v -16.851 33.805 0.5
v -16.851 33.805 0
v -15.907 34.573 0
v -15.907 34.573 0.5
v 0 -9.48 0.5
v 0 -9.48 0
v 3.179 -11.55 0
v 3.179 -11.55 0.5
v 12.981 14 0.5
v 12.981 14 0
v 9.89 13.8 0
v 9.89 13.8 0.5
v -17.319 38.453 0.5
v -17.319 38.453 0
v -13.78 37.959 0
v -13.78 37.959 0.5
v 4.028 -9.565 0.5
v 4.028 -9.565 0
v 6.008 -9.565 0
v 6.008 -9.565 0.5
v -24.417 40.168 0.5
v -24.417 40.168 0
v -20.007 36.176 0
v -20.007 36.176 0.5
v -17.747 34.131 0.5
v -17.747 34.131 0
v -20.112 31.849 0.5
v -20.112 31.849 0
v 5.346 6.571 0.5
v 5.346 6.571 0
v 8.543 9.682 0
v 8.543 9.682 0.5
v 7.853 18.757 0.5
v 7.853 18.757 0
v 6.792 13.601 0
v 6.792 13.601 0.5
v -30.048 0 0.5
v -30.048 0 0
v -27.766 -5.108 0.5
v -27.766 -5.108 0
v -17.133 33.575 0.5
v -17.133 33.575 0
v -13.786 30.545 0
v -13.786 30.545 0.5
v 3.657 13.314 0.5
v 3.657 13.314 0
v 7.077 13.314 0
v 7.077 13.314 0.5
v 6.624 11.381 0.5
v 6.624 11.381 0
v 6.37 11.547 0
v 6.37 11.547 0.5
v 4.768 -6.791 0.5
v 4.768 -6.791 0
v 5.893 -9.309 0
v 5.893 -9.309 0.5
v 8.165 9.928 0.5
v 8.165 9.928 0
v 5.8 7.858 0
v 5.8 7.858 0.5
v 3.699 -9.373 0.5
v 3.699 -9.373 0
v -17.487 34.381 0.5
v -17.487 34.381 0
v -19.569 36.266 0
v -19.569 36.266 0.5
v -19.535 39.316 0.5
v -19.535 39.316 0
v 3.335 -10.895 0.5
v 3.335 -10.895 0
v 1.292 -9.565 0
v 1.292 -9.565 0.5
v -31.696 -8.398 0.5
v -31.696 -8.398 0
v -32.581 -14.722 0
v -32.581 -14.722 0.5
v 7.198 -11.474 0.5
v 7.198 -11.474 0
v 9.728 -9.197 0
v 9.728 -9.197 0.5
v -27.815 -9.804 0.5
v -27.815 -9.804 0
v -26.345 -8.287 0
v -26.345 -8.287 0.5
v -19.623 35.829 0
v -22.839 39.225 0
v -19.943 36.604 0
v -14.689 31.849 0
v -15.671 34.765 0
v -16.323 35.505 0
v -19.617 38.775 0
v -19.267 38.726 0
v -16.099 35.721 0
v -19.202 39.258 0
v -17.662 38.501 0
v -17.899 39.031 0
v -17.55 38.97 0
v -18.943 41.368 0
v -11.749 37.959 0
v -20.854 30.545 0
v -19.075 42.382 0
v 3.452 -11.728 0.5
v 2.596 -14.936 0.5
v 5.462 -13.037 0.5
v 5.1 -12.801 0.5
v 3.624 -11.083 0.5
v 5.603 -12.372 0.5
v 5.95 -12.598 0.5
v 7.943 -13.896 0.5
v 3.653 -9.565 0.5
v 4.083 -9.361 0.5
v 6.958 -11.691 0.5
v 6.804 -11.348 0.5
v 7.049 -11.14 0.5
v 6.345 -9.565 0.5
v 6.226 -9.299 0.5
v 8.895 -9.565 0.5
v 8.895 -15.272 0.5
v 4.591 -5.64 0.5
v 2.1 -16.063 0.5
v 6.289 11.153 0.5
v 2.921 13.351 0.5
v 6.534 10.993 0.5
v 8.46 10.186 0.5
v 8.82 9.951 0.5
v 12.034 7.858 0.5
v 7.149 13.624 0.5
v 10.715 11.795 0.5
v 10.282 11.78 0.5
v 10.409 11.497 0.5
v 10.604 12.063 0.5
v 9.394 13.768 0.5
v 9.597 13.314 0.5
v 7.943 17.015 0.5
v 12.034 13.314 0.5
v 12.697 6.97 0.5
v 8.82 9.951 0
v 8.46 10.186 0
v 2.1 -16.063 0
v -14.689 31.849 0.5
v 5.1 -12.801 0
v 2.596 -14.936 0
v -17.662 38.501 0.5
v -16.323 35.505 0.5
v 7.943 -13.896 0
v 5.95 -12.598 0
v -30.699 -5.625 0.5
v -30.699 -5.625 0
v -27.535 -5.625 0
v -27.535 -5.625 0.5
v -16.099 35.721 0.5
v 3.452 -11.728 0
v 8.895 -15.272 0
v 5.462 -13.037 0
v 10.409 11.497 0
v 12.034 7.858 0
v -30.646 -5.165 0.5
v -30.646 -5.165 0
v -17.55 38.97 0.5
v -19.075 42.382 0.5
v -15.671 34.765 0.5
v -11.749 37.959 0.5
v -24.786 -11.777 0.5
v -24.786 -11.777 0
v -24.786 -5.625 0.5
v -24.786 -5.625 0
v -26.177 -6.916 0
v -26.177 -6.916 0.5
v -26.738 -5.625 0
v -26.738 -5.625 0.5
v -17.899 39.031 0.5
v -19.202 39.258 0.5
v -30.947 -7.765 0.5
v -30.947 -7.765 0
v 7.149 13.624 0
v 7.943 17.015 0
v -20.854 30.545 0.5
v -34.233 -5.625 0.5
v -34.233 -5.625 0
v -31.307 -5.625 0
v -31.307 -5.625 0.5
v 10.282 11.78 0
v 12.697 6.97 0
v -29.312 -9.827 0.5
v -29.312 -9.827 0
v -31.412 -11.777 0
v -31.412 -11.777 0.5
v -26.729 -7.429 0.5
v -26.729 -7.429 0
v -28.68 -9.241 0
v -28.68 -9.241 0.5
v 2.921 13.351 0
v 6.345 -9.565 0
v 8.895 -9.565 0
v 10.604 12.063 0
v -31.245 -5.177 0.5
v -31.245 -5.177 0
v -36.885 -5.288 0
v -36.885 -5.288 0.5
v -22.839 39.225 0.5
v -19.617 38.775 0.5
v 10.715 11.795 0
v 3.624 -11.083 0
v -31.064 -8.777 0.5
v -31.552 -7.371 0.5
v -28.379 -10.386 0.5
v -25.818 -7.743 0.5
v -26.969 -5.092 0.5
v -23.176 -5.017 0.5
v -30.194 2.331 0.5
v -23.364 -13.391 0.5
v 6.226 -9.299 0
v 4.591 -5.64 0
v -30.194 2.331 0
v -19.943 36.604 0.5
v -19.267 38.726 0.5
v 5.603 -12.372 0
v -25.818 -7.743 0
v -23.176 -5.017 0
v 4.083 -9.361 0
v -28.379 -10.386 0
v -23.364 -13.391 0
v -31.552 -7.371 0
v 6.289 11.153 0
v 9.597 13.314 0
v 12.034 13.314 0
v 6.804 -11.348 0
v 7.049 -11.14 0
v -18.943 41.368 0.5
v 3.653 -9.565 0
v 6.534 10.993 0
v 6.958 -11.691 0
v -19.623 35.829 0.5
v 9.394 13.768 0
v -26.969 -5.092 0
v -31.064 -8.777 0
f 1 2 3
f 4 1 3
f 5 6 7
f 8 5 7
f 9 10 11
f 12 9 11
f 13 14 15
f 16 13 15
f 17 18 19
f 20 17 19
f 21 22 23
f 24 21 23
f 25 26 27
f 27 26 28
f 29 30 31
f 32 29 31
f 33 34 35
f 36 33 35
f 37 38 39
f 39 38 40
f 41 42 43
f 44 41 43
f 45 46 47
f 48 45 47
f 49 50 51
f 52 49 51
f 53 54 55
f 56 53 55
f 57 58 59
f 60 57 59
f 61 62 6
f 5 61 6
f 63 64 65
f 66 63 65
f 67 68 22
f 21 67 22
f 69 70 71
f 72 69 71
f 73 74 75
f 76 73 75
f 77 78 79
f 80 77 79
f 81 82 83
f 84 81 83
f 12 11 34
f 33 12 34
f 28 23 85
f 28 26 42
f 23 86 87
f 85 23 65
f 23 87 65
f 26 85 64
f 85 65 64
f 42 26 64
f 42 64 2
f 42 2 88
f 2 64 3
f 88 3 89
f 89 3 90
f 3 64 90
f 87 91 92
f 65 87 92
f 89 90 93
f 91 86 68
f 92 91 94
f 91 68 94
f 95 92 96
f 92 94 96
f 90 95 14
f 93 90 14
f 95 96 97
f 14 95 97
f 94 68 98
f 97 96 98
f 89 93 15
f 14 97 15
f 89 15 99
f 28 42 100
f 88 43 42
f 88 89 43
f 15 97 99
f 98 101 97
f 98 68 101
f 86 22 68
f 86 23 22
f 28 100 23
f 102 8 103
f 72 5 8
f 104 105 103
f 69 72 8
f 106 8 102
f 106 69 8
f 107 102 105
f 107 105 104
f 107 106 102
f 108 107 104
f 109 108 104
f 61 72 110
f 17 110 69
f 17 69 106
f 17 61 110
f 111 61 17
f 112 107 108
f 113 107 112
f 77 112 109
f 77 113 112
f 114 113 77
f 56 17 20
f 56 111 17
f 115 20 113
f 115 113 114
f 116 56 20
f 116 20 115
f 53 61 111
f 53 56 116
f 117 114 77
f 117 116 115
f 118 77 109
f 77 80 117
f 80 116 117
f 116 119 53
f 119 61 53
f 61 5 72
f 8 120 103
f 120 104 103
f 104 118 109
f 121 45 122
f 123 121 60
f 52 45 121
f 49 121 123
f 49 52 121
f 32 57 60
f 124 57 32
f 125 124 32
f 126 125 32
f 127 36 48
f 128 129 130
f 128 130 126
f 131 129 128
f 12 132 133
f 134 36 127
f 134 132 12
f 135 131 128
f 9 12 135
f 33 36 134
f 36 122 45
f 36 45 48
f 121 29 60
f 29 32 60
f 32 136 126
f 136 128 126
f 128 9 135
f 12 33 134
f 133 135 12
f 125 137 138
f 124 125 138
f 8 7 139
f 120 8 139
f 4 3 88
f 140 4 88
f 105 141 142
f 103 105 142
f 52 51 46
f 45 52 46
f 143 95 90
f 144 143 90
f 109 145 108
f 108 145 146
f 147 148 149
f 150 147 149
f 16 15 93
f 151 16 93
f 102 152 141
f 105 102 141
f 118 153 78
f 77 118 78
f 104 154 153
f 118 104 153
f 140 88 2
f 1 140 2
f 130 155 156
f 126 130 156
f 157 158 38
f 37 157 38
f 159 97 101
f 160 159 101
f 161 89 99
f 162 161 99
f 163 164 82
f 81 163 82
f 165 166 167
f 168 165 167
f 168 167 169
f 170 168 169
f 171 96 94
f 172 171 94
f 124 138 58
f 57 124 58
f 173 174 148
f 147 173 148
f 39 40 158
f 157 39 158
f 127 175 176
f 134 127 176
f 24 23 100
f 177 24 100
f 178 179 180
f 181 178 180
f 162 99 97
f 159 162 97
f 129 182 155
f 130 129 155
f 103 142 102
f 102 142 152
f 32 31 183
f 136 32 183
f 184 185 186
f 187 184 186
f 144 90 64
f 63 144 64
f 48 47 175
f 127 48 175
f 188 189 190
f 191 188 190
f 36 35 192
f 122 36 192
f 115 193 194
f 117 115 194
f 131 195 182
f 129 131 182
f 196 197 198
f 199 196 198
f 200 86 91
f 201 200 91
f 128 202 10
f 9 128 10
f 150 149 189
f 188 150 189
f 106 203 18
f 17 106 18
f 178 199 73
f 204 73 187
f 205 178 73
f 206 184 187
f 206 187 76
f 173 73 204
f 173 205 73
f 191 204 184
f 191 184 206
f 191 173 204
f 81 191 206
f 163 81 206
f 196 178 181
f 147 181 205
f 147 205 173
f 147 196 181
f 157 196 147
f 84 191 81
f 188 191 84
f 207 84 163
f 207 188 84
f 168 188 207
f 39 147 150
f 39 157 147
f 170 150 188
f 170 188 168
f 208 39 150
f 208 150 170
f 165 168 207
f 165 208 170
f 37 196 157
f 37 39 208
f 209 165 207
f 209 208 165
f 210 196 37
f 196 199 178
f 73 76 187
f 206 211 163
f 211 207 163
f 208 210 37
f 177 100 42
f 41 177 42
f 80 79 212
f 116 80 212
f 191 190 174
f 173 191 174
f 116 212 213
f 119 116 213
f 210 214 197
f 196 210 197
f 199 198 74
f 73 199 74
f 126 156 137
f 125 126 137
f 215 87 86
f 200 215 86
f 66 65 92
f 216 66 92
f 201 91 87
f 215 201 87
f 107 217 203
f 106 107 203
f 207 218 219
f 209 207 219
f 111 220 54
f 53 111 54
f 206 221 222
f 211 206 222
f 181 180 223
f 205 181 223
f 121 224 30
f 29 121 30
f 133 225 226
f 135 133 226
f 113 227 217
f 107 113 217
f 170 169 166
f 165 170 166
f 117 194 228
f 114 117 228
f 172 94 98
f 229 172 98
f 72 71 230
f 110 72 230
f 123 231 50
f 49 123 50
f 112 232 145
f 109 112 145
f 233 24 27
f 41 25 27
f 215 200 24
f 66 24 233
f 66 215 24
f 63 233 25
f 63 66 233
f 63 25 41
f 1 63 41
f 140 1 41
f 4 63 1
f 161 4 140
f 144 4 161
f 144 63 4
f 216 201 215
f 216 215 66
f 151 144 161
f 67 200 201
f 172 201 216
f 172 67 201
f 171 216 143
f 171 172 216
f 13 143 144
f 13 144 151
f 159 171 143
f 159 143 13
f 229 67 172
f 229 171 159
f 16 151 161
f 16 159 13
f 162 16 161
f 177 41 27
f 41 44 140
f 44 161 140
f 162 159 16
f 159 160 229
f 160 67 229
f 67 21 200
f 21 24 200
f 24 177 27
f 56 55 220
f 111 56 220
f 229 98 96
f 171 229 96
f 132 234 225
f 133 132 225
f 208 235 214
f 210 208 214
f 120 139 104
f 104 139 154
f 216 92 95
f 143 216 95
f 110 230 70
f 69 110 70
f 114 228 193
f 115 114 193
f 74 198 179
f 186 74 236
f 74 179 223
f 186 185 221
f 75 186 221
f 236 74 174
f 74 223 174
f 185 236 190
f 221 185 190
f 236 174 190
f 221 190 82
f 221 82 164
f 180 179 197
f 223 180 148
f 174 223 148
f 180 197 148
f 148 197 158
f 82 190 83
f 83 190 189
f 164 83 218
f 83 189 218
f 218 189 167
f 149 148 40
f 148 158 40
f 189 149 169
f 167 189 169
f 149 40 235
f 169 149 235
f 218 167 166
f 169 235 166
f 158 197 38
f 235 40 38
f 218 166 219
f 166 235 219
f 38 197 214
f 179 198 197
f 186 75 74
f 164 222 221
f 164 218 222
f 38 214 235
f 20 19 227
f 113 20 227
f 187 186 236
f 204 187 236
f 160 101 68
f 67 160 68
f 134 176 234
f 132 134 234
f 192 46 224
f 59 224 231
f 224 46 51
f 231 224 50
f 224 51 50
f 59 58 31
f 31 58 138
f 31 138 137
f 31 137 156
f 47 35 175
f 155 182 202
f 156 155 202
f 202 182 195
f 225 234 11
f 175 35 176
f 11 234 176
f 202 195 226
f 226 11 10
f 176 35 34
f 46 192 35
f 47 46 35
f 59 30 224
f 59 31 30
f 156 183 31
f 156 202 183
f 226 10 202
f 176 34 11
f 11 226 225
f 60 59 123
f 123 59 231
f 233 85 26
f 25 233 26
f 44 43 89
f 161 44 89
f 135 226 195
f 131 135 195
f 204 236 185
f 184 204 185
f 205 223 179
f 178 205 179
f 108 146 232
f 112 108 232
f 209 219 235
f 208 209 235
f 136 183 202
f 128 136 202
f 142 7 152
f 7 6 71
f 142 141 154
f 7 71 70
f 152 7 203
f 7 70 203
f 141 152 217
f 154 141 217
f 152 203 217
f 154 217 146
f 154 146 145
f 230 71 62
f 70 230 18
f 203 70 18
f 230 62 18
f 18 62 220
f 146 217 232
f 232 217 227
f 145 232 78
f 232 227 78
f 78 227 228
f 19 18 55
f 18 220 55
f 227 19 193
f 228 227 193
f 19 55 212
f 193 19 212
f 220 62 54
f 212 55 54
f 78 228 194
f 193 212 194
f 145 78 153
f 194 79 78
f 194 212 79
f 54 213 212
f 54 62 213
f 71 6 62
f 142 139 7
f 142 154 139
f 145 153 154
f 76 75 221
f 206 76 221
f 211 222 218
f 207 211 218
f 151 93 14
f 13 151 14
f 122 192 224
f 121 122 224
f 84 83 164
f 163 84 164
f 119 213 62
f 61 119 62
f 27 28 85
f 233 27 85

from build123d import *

# Parameters (mm, degrees)
F1_DEPTH = 0.5
F2_DEPTH = 0.5
F3_DEPTH = 0.5
F4_DEPTH = 0.5


with BuildPart() as f1:
    # F0 (on Top) → F1 (new body)
    with BuildSketch(Plane.XY):
        Polygon((-19.6167158214, 38.774628421), (-19.5352793666, 39.3164274172), (-24.4169946969, 40.1676073624), (-20.0072566577, 36.176349387), (-19.9430271905, 36.6036698165), (-22.8393096477, 39.2250977457), align=None)
        Polygon((-19.2672995463, 38.7257853704), (-19.2019097122, 39.2583008069), (-19.5352793666, 39.3164274172), (-19.6167158214, 38.774628421), align=None)
        Polygon((-19.2019097122, 39.2583008069), (-18.9428310841, 41.3681603968), (-17.8985916241, 39.0310531811), (-17.5501562208, 38.9702996944), (-19.0745089203, 42.3819459975), (-19.5352793666, 39.3164274172), align=None)
        Polygon((-17.5501562208, 38.9702996944), (-17.8985916241, 39.0310531811), (-17.6619287146, 38.5013790836), (-17.3192348579, 38.4534757243), align=None)
        Polygon((-17.6619287146, 38.5013790836), (-17.8985916241, 39.0310531811), (-19.2019097122, 39.2583008069), (-19.2672995463, 38.7257853704), align=None)
        Polygon((-11.7486538365, 37.9587449133), (-17.5501562208, 38.9702996944), (-17.3192348579, 38.4534757243), (-13.7800006196, 37.9587449133), (-16.0985169635, 35.7213929896), (-15.6711739502, 34.7649586869), align=None)
        Polygon((-17.3192348579, 38.4534757243), (-17.6619287146, 38.5013790836), (-16.3230122226, 35.5047566474), (-16.0985169635, 35.7213929896), align=None)
        Polygon((-16.0985169635, 35.7213929896), (-16.3230122226, 35.5047566474), (-15.9067585949, 34.573141444), (-15.6711739502, 34.7649586869), align=None)
        Polygon((-15.6711739502, 34.7649586869), (-15.9067585949, 34.573141444), (-14.6894223923, 31.8486272574), (-16.850563786, 33.8046783304), (-17.1329166357, 33.5747815762), (-13.7857930403, 30.545296916), align=None)
        Polygon((-15.9067585949, 34.573141444), (-16.3230122226, 35.5047566474), (-17.487427419, 34.3811041934), (-16.850563786, 33.8046783304), align=None)
        Polygon((-20.1117750257, 31.8486272574), (-19.623056132, 35.828609136), (-20.0072566577, 36.176349387), (-20.8536460996, 30.545296916), (-17.1329166357, 33.5747815762), (-17.7470157672, 34.1306032677), align=None)
        Polygon((-19.569407656, 36.2655064304), (-19.2672995463, 38.7257853704), (-19.6167158214, 38.774628421), (-19.9430271905, 36.6036698165), align=None)
        Polygon((-19.623056132, 35.828609136), (-19.569407656, 36.2655064304), (-19.9430271905, 36.6036698165), (-20.0072566577, 36.176349387), align=None)
        Polygon((-17.487427419, 34.3811041934), (-19.569407656, 36.2655064304), (-19.623056132, 35.828609136), (-17.7470157672, 34.1306032677), align=None)
        Polygon((-16.850563786, 33.8046783304), (-17.487427419, 34.3811041934), (-17.7470157672, 34.1306032677), (-17.1329166357, 33.5747815762), align=None)
    extrude(amount=F1_DEPTH)


with BuildPart() as f2:
    # F0 (on Top) → F2 (new body)
    with BuildSketch(Plane.XY):
        Polygon((9.727650322, -9.1974353418), (6.2263924098, -9.2991656192), (6.3452222104, -9.5651180134), (8.8952556252, -9.5651180134), (7.0487103065, -11.1395912723), (7.1981960204, -11.4741545155), align=None)
        Polygon((7.1981960204, -11.4741545155), (6.9575831839, -11.6907260732), (7.9428590834, -13.8958672333), (5.9496410632, -12.5979577836), (5.4620956469, -13.0367891934), (8.8952556252, -15.2723352968), align=None)
        Polygon((2.5960605126, -14.9361826479), (3.4516637515, -11.7276707083), (3.1787102129, -11.5499335147), (2.1001494024, -16.0628203303), (5.4620956469, -13.0367891934), (5.1001133386, -12.8010797758), align=None)
        Polygon((3.6530727004, -9.5651180134), (3.6990843002, -9.3725974433), (0, -9.4800756359), (3.1787102129, -11.5499335147), (3.3351218093, -10.8954800758), (1.2920658497, -9.5651180134), align=None)
        Polygon((4.0826552732, -9.3614526541), (4.768196959, -6.7906714976), (5.8933373326, -9.3088426514), (6.2263924098, -9.2991656192), (4.591259174, -5.6395819411), (3.6990843002, -9.3725974433), align=None)
        Polygon((6.2263924098, -9.2991656192), (5.8933373326, -9.3088426514), (6.0078433527, -9.5651180134), (6.3452222104, -9.5651180134), align=None)
        Polygon((4.0283445073, -9.5651180134), (4.0826552732, -9.3614526541), (3.6990843002, -9.3725974433), (3.6530727004, -9.5651180134), align=None)
        Polygon((3.4516637515, -11.7276707083), (3.6235053597, -11.0832647192), (3.3351218093, -10.8954800758), (3.1787102129, -11.5499335147), align=None)
        Polygon((5.9496410632, -12.5979577836), (5.6030339038, -12.3722600912), (5.1001133386, -12.8010797758), (5.4620956469, -13.0367891934), align=None)
        Polygon((7.0487103065, -11.1395912723), (6.8044055273, -11.3478999111), (6.9575831839, -11.6907260732), (7.1981960204, -11.4741545155), align=None)
        Polygon((6.3452222104, -9.5651180134), (6.0078433527, -9.5651180134), (6.8044055273, -11.3478999111), (7.0487103065, -11.1395912723), align=None)
        Polygon((6.9575831839, -11.6907260732), (6.8044055273, -11.3478999111), (5.6030339038, -12.3722600912), (5.9496410632, -12.5979577836), align=None)
        Polygon((5.6030339038, -12.3722600912), (3.6235053597, -11.0832647192), (3.4516637515, -11.7276707083), (5.1001133386, -12.8010797758), align=None)
        Polygon((3.6235053597, -11.0832647192), (4.0283445073, -9.5651180134), (3.6530727004, -9.5651180134), (3.3351218093, -10.8954800758), align=None)
        Polygon((6.0078433527, -9.5651180134), (5.8933373326, -9.3088426514), (4.0826552732, -9.3614526541), (4.0283445073, -9.5651180134), align=None)
    extrude(amount=F2_DEPTH)


with BuildPart() as f3:
    # F0 (on Top) → F3 (new body)
    with BuildSketch(Plane.XY):
        Polygon((7.1491269104, 13.6237768702), (7.9428590834, 17.0151796192), (9.3935150739, 13.7684735591), (9.8902208701, 13.8004963996), (7.8531634063, 18.7569092959), (6.7921524895, 13.6007625727), align=None)
        Polygon((9.8902208701, 13.8004963996), (9.3935150739, 13.7684735591), (9.5967889834, 13.313527219), (10.0903624291, 13.313527219), align=None)
        Polygon((12.9811568186, 13.9997703955), (9.8902208701, 13.8004963996), (10.0903624291, 13.313527219), (12.034160085, 13.313527219), (10.6044977469, 12.0625723662), (10.7146382492, 11.7945868941), align=None)
        Polygon((10.6044977469, 12.0625723662), (10.2818628483, 11.7802667606), (10.4085335129, 11.4967657673), (10.7146382492, 11.7945868941), align=None)
        Polygon((10.7146382492, 11.7945868941), (10.4085335129, 11.4967657673), (12.034160085, 7.8584589064), (8.8201110132, 9.9513281359), (8.5430646382, 9.6817790117), (12.6973846927, 6.9703194313), align=None)
        Polygon((8.8201110132, 9.9513281359), (8.4597920659, 10.1859544347), (8.1653433701, 9.9283117626), (8.5430646382, 9.6817790117), align=None)
        Polygon((5.7997978292, 7.8584589064), (6.5335041921, 10.993387615), (6.2885204346, 11.1532846734), (5.3455550224, 6.5707983449), (8.5430646382, 9.6817790117), (8.1653433701, 9.9283117626), align=None)
        Polygon((6.5335041921, 10.993387615), (6.6242644754, 11.3811817409), (6.3695467247, 11.5470444675), (6.2885204346, 11.1532846734), align=None)
        Polygon((6.7330463658, 13.313527219), (6.7921524895, 13.6007625727), (2.921034582, 13.3511899039), (6.2885204346, 11.1532846734), (6.3695467247, 11.5470444675), (3.6567340139, 13.313527219), align=None)
        Polygon((7.0765153252, 13.313527219), (7.1491269104, 13.6237768702), (6.7921524895, 13.6007625727), (6.7330463658, 13.313527219), align=None)
    extrude(amount=F3_DEPTH)


with BuildPart() as f4:
    # F0 (on Top) → F4 (new body)
    with BuildSketch(Plane.XY):
        Polygon((-23.1763347983, -5.0166766159), (-26.9692986834, -5.0918713644), (-26.7378190997, -5.624759172), (-24.7859191842, -5.624759172), (-26.1768325942, -6.9162029543), (-25.8178103555, -7.7427059688), align=None)
        Polygon((-26.1768325942, -6.9162029543), (-26.7286486181, -7.428556468), (-26.345130752, -8.2869059238), (-25.8178103555, -7.7427059688), align=None)
        Polygon((-26.345130752, -8.2869059238), (-26.7286486181, -7.428556468), (-28.6803354887, -9.2406706195), (-27.8151896014, -9.8040214478), align=None)
        Polygon((-27.8151896014, -9.8040214478), (-28.6803354887, -9.2406706195), (-29.3117399448, -9.8269208872), (-28.3789852405, -10.38586422), align=None)
        Polygon((-31.4115546644, -11.7765696891), (-31.064171377, -8.7767949957), (-31.6956915622, -8.3983632435), (-32.5808562338, -14.7222373635), (-28.3789852405, -10.38586422), (-29.3117399448, -9.8269208872), align=None)
        Polygon((-28.6803354887, -9.2406706195), (-30.9469702048, -7.7647223854), (-31.064171377, -8.7767949957), (-29.3117399448, -9.8269208872), align=None)
        Polygon((-31.064171377, -8.7767949957), (-30.9469702048, -7.7647223854), (-31.5518666652, -7.3708363057), (-31.6956915622, -8.3983632435), align=None)
        Polygon((-31.3074649324, -5.624759172), (-31.2447395983, -5.1766311232), (-36.8854478002, -5.2884570323), (-31.6956915622, -8.3983632435), (-31.5518666652, -7.3708363057), (-34.2333421781, -5.624759172), align=None)
        Polygon((-30.9469702048, -7.7647223854), (-30.6991557748, -5.624759172), (-31.3074649324, -5.624759172), (-31.5518666652, -7.3708363057), align=None)
        Polygon((-30.6458863142, -5.164758977), (-30.0477910787, 0), (-27.7656455223, -5.1076587808), (-26.9692986834, -5.0918713644), (-30.1938373595, 2.3313204292), (-31.2447395983, -5.1766311232), align=None)
        Polygon((-25.8178103555, -7.7427059688), (-26.345130752, -8.2869059238), (-24.7859191842, -11.7765696891), (-27.8151896014, -9.8040214478), (-28.3789852405, -10.38586422), (-23.3643334359, -13.3908409625), align=None)
        Polygon((-26.9692986834, -5.0918713644), (-27.7656455223, -5.1076587808), (-27.5346006521, -5.624759172), (-26.7378190997, -5.624759172), align=None)
        Polygon((-26.7378190997, -5.624759172), (-27.5346006521, -5.624759172), (-26.7286486181, -7.428556468), (-26.1768325942, -6.9162029543), align=None)
        Polygon((-27.5346006521, -5.624759172), (-27.7656455223, -5.1076587808), (-30.6458863142, -5.164758977), (-30.6991557748, -5.624759172), align=None)
        Polygon((-30.6991557748, -5.624759172), (-30.6458863142, -5.164758977), (-31.2447395983, -5.1766311232), (-31.3074649324, -5.624759172), align=None)
    extrude(amount=F4_DEPTH)


solid = Compound([f1.part, f2.part, f3.part, f4.part])
